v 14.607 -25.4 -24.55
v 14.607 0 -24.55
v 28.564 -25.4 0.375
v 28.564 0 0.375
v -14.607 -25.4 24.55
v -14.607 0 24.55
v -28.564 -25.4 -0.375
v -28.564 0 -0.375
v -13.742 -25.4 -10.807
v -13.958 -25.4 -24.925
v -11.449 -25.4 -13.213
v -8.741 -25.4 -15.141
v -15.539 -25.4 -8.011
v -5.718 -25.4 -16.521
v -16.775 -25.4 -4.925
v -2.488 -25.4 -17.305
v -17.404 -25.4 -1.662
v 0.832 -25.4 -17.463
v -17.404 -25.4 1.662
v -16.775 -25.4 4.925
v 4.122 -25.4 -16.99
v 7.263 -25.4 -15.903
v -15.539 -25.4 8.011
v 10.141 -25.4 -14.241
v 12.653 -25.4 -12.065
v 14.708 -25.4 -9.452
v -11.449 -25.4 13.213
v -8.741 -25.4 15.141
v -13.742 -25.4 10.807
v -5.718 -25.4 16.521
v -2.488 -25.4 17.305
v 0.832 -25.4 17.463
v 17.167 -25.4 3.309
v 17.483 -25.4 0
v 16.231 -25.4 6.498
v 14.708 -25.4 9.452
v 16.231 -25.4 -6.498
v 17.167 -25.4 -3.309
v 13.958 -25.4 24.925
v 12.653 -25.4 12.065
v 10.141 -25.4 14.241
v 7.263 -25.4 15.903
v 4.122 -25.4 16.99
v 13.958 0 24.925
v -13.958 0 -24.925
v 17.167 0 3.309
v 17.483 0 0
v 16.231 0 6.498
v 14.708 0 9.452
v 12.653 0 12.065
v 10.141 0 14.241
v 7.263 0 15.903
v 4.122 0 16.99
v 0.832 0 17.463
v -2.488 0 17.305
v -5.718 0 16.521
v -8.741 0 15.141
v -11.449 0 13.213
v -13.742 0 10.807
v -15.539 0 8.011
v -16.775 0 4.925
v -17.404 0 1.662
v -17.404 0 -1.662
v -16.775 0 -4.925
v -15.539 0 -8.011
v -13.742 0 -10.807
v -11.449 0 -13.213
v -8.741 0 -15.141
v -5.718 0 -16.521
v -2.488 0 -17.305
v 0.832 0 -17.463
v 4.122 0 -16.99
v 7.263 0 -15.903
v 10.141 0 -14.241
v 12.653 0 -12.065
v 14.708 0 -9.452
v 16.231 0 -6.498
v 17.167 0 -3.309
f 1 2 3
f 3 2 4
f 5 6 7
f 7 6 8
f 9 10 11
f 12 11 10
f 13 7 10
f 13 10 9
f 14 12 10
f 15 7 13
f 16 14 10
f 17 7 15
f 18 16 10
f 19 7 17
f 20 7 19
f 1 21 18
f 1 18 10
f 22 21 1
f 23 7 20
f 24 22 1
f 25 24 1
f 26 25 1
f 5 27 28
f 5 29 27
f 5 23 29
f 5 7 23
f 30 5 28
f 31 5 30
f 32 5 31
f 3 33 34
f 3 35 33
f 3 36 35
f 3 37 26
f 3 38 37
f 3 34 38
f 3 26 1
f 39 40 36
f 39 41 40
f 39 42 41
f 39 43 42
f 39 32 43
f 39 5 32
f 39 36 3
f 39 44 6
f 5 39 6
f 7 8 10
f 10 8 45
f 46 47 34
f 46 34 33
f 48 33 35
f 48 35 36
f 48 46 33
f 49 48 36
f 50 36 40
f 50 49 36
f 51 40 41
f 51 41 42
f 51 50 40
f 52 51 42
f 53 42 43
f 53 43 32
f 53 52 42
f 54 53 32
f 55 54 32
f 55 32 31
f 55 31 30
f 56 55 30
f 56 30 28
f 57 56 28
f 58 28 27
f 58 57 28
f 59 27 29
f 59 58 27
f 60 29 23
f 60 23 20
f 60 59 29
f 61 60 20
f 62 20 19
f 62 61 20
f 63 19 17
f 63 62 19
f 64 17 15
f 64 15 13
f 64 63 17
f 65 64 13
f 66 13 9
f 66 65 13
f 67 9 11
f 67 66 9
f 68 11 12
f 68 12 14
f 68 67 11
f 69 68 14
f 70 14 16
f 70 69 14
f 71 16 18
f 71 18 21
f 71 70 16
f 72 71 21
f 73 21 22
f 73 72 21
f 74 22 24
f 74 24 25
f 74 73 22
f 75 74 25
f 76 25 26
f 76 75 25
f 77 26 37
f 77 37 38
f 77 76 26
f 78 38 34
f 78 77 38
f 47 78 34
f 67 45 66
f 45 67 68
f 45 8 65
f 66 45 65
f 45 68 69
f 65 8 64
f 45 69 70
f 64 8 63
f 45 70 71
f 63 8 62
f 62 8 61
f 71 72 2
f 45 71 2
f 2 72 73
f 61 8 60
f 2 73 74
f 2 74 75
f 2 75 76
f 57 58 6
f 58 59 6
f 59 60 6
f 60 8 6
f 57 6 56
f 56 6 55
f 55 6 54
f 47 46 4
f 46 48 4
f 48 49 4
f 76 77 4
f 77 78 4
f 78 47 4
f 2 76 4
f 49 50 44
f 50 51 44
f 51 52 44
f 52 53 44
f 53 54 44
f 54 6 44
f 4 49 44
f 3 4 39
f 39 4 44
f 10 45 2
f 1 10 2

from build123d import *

# Parameters (mm, degrees)
F0_R     = 17.482868
F1_DEPTH = 25.4
F2_DEPTH = 25.4


with BuildPart() as f1:
    # F0 (on Front) → F1 (new body)
    with BuildSketch(Plane.XZ):
        Polygon((-14.606514, 24.550197), (-28.564351, -0.374514), (-13.957837, -24.924711), (14.606514, -24.550197), (28.564351, 0.374514), (13.957837, 24.924711), align=None)
        Circle(F0_R, mode=Mode.SUBTRACT)
    extrude(amount=F1_DEPTH)

    # F0 (on Front) → F2 (join)
    with BuildSketch(Plane.XZ):
        Polygon((-14.606514, 24.550197), (-28.564351, -0.374514), (-13.957837, -24.924711), (14.606514, -24.550197), (28.564351, 0.374514), (13.957837, 24.924711), align=None)
        Circle(F0_R, mode=Mode.SUBTRACT)
    extrude(amount=F2_DEPTH)


solid = f1.part
